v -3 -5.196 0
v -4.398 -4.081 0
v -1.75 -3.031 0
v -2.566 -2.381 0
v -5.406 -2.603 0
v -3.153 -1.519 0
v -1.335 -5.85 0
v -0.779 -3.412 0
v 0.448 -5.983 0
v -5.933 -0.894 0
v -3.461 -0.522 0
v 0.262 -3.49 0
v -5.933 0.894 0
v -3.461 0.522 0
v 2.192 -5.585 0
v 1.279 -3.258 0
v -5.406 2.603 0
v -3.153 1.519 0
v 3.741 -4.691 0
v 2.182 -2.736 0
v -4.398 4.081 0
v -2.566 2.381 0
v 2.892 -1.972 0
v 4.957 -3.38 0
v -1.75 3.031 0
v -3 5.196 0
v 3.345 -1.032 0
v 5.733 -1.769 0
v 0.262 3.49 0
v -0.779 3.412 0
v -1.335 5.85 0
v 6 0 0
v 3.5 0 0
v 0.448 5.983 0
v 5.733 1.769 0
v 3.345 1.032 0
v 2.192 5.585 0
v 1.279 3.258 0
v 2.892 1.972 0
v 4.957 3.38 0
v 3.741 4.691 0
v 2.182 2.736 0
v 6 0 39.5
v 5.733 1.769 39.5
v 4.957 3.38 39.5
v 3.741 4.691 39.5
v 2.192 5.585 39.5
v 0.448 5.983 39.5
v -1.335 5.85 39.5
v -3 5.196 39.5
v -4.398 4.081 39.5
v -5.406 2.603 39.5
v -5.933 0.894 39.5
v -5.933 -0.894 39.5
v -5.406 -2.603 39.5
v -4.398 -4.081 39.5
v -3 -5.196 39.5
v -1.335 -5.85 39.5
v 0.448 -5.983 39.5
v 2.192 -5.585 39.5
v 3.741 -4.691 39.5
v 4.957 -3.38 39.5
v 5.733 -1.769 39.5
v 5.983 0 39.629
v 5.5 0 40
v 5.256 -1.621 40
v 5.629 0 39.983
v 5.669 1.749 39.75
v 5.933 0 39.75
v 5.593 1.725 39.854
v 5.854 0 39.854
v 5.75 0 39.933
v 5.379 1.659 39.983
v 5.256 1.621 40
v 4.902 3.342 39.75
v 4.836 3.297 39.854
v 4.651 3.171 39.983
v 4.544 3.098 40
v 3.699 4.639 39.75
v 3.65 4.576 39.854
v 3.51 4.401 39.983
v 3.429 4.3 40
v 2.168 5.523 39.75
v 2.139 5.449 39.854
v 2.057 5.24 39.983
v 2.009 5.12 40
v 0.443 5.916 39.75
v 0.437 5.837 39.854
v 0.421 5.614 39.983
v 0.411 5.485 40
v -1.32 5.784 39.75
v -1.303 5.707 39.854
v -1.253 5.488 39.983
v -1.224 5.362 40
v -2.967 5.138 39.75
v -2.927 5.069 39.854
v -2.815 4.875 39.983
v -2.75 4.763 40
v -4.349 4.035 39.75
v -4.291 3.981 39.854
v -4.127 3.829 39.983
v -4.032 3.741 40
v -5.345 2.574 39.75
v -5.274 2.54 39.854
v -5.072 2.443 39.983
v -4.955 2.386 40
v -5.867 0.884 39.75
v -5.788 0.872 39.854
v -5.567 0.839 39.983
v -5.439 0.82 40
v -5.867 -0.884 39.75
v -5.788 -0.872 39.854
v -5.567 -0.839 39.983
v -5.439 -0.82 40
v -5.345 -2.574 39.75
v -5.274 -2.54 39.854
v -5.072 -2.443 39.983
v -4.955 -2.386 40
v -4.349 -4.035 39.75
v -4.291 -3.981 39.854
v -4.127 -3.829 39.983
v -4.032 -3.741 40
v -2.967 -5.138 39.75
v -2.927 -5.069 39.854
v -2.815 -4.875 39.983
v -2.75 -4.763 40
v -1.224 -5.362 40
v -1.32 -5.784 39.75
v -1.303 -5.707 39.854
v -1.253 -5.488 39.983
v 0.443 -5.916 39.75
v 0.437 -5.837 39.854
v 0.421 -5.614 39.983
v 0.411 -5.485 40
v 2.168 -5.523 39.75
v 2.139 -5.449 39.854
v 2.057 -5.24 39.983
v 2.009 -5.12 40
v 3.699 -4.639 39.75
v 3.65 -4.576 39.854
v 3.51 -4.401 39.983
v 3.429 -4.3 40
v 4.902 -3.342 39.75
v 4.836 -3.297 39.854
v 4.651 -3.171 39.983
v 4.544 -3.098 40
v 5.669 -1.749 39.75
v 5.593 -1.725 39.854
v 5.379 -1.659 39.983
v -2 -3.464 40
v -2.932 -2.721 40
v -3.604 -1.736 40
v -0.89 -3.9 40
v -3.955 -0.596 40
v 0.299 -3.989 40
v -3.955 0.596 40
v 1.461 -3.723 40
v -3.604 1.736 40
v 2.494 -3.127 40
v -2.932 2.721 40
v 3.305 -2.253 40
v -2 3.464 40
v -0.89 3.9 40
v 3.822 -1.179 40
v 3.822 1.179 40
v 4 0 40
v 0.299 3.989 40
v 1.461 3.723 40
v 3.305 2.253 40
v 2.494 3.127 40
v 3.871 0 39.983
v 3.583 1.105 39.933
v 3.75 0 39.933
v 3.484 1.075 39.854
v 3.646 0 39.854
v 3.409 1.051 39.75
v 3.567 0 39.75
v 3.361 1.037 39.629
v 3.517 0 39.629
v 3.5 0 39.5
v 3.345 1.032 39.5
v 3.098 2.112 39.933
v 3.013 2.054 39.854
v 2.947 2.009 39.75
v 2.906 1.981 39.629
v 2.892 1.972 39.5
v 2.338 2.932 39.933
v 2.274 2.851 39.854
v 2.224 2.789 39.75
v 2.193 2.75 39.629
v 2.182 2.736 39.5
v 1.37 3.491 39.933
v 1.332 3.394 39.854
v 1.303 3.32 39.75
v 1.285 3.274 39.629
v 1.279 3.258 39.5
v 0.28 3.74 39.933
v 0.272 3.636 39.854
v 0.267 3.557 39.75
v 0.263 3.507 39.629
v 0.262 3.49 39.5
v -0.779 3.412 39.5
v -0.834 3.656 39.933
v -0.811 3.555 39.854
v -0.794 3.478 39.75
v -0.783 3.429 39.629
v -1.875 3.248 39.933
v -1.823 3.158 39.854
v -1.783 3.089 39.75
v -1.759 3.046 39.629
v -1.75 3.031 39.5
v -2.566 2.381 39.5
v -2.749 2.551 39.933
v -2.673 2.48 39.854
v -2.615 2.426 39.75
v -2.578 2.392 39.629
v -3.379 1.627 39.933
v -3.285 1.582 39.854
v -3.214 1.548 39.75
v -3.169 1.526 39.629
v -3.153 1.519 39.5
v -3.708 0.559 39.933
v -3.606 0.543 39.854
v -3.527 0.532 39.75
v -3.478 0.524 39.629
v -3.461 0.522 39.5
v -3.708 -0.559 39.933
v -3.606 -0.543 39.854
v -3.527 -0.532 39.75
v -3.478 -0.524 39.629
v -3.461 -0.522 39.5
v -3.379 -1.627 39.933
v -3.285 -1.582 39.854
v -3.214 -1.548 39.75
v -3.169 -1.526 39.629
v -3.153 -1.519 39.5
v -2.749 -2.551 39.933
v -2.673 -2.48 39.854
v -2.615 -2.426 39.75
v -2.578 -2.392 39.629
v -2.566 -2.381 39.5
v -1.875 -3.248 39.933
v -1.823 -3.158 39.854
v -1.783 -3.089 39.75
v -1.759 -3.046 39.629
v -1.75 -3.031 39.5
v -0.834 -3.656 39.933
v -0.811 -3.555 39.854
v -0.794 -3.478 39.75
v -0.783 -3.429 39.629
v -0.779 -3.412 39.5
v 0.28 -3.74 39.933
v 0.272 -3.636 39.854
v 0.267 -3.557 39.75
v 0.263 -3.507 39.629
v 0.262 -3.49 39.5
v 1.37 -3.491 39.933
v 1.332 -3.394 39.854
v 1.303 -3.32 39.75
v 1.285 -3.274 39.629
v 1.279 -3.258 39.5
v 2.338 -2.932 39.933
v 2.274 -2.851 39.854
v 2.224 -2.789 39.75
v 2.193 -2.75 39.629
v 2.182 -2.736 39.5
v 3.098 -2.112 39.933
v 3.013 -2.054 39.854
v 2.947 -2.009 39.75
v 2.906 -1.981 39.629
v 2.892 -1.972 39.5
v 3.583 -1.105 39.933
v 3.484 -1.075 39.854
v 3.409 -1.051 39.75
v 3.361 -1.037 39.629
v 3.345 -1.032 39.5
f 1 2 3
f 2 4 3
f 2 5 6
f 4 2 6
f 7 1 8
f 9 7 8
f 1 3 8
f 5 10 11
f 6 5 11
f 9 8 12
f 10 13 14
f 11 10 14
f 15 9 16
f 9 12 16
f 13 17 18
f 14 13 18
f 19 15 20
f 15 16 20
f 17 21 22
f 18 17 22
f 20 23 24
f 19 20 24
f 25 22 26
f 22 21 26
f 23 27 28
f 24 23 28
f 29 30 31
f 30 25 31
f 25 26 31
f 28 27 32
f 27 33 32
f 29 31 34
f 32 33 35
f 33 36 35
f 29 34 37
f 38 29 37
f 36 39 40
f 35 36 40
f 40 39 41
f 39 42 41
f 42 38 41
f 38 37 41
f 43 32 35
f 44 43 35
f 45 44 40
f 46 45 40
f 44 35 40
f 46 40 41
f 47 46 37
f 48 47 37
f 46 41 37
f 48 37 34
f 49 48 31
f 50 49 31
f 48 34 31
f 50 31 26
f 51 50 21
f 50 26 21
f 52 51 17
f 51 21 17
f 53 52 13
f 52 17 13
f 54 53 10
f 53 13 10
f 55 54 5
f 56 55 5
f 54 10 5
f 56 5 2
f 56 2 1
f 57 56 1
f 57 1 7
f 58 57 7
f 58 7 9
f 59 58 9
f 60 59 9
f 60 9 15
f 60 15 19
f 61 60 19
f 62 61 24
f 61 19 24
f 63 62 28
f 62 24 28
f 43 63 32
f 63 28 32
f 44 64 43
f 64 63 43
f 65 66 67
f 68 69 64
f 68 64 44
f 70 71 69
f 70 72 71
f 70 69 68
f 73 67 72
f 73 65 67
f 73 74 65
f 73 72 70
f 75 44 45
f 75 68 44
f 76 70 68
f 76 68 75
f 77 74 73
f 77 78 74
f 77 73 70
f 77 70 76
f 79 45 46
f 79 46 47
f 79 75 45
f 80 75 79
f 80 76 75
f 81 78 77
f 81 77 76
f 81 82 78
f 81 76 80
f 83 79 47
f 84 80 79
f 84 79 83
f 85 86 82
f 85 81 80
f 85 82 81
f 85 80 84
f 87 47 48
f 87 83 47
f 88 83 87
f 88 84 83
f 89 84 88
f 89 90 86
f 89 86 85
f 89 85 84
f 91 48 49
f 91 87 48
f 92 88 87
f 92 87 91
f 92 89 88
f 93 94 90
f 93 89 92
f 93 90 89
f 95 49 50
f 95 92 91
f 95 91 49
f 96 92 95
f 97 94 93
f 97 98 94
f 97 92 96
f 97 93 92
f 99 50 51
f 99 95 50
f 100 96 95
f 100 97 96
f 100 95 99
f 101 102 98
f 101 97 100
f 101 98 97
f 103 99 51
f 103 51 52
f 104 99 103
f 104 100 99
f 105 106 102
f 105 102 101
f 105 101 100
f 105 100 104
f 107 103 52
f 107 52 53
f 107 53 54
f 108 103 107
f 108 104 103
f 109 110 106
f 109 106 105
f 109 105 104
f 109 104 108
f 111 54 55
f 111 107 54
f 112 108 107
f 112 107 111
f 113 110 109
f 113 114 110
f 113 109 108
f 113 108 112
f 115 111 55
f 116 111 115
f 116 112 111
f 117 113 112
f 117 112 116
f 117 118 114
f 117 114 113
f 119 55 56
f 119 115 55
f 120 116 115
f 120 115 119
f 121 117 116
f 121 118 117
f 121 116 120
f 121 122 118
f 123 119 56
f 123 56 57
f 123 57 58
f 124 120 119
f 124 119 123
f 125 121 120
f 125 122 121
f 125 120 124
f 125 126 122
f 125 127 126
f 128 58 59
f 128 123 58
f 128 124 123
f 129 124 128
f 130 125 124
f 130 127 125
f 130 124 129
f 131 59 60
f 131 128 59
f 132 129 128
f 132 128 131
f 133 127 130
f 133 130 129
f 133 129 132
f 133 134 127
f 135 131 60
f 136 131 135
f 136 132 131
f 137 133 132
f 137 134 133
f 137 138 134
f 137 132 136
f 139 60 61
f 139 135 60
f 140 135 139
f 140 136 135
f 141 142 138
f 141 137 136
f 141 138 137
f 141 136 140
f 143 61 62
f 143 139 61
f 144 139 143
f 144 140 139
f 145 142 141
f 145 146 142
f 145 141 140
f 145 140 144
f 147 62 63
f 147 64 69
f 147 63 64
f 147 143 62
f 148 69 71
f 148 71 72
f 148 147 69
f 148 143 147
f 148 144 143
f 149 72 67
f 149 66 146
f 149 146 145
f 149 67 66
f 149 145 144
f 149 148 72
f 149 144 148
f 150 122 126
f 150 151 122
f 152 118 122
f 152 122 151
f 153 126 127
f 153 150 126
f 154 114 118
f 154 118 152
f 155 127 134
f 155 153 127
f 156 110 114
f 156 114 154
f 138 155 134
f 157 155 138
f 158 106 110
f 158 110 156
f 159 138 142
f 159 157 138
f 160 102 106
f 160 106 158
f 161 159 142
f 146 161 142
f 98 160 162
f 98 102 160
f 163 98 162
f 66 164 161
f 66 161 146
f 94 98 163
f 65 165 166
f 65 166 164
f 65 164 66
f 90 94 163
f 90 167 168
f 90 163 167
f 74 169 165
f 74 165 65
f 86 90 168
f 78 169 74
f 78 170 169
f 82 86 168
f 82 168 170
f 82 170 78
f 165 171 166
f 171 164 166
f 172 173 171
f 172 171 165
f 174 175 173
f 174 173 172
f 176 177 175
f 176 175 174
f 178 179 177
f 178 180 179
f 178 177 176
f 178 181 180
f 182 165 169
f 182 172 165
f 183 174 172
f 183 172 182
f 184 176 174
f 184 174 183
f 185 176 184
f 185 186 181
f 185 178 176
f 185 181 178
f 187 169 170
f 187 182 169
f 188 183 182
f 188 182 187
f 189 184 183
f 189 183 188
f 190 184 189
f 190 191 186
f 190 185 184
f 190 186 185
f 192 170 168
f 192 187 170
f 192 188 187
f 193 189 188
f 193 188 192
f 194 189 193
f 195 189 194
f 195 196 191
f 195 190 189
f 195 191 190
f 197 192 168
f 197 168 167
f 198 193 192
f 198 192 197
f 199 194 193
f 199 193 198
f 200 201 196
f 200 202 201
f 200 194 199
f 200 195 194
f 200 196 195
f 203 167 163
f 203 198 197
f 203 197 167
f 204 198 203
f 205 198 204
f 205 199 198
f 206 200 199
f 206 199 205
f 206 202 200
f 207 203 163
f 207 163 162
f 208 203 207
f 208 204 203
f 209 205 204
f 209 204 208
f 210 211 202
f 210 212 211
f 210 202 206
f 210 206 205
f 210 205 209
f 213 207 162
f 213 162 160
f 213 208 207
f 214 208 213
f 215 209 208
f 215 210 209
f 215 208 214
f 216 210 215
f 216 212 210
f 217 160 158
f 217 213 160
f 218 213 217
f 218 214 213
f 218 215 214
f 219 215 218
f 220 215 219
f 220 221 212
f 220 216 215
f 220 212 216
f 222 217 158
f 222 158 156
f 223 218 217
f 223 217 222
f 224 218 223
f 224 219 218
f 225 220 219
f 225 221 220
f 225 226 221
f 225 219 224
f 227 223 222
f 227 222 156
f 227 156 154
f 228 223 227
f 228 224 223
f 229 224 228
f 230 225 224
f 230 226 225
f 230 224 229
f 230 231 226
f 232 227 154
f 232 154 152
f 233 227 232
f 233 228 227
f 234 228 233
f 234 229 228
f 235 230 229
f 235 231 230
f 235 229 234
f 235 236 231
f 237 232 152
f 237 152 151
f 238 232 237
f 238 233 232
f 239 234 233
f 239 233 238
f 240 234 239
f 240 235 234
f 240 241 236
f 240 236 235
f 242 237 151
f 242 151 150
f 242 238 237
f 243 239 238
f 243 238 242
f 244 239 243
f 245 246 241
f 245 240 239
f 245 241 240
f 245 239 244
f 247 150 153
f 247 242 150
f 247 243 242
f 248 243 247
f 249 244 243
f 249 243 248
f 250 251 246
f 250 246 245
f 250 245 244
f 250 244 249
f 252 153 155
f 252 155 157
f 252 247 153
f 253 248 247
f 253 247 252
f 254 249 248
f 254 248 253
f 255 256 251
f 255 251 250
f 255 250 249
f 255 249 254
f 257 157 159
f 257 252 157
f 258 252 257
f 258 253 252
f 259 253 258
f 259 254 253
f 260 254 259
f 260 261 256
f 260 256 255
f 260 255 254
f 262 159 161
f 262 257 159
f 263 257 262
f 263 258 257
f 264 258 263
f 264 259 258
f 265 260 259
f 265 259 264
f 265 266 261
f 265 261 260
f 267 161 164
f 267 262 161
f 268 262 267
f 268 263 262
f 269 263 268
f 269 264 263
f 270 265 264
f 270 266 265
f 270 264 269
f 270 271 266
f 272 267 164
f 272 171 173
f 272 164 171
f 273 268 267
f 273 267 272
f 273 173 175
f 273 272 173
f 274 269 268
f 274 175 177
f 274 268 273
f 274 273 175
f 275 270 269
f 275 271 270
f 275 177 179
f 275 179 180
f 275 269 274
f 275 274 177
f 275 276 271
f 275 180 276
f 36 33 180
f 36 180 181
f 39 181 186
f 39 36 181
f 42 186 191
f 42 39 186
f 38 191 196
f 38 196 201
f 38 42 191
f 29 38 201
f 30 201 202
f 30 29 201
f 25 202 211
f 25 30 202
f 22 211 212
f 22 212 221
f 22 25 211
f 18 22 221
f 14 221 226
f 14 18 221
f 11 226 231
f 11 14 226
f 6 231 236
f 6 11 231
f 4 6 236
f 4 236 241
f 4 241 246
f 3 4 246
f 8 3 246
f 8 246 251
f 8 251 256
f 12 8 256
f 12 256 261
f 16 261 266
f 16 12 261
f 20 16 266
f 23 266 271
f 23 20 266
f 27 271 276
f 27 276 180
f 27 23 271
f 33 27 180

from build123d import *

# Parameters (mm, degrees)
SZKIC1_R                    = 6
SZKIC1_R_2                  = 3.5
DODANIE_WYCI_GNI_CIE1_DEPTH = 40
ZAOKR_GLENIE1_R             = 0.5
ZAOKR_GLENIE2_R             = 0.5


with BuildPart() as part:
    # Szkic1 → Dodanie-wyciągnięcie1 (new body)
    with BuildSketch(Plane.XY):
        Circle(SZKIC1_R)
        Circle(SZKIC1_R_2, mode=Mode.SUBTRACT)
    extrude(amount=DODANIE_WYCI_GNI_CIE1_DEPTH)

    # Zaokrąglenie1
    zaokr_glenie1_edges = [part.edges().sort_by_distance(p)[0] for p in [
        (-6, 0, 40),
    ]]
    fillet(zaokr_glenie1_edges, radius=ZAOKR_GLENIE1_R)

    # Zaokrąglenie2
    zaokr_glenie2_edges = [part.edges().sort_by_distance(p)[0] for p in [
        (-3.5, 0, 40),
    ]]
    fillet(zaokr_glenie2_edges, radius=ZAOKR_GLENIE2_R)


solid = part.part
